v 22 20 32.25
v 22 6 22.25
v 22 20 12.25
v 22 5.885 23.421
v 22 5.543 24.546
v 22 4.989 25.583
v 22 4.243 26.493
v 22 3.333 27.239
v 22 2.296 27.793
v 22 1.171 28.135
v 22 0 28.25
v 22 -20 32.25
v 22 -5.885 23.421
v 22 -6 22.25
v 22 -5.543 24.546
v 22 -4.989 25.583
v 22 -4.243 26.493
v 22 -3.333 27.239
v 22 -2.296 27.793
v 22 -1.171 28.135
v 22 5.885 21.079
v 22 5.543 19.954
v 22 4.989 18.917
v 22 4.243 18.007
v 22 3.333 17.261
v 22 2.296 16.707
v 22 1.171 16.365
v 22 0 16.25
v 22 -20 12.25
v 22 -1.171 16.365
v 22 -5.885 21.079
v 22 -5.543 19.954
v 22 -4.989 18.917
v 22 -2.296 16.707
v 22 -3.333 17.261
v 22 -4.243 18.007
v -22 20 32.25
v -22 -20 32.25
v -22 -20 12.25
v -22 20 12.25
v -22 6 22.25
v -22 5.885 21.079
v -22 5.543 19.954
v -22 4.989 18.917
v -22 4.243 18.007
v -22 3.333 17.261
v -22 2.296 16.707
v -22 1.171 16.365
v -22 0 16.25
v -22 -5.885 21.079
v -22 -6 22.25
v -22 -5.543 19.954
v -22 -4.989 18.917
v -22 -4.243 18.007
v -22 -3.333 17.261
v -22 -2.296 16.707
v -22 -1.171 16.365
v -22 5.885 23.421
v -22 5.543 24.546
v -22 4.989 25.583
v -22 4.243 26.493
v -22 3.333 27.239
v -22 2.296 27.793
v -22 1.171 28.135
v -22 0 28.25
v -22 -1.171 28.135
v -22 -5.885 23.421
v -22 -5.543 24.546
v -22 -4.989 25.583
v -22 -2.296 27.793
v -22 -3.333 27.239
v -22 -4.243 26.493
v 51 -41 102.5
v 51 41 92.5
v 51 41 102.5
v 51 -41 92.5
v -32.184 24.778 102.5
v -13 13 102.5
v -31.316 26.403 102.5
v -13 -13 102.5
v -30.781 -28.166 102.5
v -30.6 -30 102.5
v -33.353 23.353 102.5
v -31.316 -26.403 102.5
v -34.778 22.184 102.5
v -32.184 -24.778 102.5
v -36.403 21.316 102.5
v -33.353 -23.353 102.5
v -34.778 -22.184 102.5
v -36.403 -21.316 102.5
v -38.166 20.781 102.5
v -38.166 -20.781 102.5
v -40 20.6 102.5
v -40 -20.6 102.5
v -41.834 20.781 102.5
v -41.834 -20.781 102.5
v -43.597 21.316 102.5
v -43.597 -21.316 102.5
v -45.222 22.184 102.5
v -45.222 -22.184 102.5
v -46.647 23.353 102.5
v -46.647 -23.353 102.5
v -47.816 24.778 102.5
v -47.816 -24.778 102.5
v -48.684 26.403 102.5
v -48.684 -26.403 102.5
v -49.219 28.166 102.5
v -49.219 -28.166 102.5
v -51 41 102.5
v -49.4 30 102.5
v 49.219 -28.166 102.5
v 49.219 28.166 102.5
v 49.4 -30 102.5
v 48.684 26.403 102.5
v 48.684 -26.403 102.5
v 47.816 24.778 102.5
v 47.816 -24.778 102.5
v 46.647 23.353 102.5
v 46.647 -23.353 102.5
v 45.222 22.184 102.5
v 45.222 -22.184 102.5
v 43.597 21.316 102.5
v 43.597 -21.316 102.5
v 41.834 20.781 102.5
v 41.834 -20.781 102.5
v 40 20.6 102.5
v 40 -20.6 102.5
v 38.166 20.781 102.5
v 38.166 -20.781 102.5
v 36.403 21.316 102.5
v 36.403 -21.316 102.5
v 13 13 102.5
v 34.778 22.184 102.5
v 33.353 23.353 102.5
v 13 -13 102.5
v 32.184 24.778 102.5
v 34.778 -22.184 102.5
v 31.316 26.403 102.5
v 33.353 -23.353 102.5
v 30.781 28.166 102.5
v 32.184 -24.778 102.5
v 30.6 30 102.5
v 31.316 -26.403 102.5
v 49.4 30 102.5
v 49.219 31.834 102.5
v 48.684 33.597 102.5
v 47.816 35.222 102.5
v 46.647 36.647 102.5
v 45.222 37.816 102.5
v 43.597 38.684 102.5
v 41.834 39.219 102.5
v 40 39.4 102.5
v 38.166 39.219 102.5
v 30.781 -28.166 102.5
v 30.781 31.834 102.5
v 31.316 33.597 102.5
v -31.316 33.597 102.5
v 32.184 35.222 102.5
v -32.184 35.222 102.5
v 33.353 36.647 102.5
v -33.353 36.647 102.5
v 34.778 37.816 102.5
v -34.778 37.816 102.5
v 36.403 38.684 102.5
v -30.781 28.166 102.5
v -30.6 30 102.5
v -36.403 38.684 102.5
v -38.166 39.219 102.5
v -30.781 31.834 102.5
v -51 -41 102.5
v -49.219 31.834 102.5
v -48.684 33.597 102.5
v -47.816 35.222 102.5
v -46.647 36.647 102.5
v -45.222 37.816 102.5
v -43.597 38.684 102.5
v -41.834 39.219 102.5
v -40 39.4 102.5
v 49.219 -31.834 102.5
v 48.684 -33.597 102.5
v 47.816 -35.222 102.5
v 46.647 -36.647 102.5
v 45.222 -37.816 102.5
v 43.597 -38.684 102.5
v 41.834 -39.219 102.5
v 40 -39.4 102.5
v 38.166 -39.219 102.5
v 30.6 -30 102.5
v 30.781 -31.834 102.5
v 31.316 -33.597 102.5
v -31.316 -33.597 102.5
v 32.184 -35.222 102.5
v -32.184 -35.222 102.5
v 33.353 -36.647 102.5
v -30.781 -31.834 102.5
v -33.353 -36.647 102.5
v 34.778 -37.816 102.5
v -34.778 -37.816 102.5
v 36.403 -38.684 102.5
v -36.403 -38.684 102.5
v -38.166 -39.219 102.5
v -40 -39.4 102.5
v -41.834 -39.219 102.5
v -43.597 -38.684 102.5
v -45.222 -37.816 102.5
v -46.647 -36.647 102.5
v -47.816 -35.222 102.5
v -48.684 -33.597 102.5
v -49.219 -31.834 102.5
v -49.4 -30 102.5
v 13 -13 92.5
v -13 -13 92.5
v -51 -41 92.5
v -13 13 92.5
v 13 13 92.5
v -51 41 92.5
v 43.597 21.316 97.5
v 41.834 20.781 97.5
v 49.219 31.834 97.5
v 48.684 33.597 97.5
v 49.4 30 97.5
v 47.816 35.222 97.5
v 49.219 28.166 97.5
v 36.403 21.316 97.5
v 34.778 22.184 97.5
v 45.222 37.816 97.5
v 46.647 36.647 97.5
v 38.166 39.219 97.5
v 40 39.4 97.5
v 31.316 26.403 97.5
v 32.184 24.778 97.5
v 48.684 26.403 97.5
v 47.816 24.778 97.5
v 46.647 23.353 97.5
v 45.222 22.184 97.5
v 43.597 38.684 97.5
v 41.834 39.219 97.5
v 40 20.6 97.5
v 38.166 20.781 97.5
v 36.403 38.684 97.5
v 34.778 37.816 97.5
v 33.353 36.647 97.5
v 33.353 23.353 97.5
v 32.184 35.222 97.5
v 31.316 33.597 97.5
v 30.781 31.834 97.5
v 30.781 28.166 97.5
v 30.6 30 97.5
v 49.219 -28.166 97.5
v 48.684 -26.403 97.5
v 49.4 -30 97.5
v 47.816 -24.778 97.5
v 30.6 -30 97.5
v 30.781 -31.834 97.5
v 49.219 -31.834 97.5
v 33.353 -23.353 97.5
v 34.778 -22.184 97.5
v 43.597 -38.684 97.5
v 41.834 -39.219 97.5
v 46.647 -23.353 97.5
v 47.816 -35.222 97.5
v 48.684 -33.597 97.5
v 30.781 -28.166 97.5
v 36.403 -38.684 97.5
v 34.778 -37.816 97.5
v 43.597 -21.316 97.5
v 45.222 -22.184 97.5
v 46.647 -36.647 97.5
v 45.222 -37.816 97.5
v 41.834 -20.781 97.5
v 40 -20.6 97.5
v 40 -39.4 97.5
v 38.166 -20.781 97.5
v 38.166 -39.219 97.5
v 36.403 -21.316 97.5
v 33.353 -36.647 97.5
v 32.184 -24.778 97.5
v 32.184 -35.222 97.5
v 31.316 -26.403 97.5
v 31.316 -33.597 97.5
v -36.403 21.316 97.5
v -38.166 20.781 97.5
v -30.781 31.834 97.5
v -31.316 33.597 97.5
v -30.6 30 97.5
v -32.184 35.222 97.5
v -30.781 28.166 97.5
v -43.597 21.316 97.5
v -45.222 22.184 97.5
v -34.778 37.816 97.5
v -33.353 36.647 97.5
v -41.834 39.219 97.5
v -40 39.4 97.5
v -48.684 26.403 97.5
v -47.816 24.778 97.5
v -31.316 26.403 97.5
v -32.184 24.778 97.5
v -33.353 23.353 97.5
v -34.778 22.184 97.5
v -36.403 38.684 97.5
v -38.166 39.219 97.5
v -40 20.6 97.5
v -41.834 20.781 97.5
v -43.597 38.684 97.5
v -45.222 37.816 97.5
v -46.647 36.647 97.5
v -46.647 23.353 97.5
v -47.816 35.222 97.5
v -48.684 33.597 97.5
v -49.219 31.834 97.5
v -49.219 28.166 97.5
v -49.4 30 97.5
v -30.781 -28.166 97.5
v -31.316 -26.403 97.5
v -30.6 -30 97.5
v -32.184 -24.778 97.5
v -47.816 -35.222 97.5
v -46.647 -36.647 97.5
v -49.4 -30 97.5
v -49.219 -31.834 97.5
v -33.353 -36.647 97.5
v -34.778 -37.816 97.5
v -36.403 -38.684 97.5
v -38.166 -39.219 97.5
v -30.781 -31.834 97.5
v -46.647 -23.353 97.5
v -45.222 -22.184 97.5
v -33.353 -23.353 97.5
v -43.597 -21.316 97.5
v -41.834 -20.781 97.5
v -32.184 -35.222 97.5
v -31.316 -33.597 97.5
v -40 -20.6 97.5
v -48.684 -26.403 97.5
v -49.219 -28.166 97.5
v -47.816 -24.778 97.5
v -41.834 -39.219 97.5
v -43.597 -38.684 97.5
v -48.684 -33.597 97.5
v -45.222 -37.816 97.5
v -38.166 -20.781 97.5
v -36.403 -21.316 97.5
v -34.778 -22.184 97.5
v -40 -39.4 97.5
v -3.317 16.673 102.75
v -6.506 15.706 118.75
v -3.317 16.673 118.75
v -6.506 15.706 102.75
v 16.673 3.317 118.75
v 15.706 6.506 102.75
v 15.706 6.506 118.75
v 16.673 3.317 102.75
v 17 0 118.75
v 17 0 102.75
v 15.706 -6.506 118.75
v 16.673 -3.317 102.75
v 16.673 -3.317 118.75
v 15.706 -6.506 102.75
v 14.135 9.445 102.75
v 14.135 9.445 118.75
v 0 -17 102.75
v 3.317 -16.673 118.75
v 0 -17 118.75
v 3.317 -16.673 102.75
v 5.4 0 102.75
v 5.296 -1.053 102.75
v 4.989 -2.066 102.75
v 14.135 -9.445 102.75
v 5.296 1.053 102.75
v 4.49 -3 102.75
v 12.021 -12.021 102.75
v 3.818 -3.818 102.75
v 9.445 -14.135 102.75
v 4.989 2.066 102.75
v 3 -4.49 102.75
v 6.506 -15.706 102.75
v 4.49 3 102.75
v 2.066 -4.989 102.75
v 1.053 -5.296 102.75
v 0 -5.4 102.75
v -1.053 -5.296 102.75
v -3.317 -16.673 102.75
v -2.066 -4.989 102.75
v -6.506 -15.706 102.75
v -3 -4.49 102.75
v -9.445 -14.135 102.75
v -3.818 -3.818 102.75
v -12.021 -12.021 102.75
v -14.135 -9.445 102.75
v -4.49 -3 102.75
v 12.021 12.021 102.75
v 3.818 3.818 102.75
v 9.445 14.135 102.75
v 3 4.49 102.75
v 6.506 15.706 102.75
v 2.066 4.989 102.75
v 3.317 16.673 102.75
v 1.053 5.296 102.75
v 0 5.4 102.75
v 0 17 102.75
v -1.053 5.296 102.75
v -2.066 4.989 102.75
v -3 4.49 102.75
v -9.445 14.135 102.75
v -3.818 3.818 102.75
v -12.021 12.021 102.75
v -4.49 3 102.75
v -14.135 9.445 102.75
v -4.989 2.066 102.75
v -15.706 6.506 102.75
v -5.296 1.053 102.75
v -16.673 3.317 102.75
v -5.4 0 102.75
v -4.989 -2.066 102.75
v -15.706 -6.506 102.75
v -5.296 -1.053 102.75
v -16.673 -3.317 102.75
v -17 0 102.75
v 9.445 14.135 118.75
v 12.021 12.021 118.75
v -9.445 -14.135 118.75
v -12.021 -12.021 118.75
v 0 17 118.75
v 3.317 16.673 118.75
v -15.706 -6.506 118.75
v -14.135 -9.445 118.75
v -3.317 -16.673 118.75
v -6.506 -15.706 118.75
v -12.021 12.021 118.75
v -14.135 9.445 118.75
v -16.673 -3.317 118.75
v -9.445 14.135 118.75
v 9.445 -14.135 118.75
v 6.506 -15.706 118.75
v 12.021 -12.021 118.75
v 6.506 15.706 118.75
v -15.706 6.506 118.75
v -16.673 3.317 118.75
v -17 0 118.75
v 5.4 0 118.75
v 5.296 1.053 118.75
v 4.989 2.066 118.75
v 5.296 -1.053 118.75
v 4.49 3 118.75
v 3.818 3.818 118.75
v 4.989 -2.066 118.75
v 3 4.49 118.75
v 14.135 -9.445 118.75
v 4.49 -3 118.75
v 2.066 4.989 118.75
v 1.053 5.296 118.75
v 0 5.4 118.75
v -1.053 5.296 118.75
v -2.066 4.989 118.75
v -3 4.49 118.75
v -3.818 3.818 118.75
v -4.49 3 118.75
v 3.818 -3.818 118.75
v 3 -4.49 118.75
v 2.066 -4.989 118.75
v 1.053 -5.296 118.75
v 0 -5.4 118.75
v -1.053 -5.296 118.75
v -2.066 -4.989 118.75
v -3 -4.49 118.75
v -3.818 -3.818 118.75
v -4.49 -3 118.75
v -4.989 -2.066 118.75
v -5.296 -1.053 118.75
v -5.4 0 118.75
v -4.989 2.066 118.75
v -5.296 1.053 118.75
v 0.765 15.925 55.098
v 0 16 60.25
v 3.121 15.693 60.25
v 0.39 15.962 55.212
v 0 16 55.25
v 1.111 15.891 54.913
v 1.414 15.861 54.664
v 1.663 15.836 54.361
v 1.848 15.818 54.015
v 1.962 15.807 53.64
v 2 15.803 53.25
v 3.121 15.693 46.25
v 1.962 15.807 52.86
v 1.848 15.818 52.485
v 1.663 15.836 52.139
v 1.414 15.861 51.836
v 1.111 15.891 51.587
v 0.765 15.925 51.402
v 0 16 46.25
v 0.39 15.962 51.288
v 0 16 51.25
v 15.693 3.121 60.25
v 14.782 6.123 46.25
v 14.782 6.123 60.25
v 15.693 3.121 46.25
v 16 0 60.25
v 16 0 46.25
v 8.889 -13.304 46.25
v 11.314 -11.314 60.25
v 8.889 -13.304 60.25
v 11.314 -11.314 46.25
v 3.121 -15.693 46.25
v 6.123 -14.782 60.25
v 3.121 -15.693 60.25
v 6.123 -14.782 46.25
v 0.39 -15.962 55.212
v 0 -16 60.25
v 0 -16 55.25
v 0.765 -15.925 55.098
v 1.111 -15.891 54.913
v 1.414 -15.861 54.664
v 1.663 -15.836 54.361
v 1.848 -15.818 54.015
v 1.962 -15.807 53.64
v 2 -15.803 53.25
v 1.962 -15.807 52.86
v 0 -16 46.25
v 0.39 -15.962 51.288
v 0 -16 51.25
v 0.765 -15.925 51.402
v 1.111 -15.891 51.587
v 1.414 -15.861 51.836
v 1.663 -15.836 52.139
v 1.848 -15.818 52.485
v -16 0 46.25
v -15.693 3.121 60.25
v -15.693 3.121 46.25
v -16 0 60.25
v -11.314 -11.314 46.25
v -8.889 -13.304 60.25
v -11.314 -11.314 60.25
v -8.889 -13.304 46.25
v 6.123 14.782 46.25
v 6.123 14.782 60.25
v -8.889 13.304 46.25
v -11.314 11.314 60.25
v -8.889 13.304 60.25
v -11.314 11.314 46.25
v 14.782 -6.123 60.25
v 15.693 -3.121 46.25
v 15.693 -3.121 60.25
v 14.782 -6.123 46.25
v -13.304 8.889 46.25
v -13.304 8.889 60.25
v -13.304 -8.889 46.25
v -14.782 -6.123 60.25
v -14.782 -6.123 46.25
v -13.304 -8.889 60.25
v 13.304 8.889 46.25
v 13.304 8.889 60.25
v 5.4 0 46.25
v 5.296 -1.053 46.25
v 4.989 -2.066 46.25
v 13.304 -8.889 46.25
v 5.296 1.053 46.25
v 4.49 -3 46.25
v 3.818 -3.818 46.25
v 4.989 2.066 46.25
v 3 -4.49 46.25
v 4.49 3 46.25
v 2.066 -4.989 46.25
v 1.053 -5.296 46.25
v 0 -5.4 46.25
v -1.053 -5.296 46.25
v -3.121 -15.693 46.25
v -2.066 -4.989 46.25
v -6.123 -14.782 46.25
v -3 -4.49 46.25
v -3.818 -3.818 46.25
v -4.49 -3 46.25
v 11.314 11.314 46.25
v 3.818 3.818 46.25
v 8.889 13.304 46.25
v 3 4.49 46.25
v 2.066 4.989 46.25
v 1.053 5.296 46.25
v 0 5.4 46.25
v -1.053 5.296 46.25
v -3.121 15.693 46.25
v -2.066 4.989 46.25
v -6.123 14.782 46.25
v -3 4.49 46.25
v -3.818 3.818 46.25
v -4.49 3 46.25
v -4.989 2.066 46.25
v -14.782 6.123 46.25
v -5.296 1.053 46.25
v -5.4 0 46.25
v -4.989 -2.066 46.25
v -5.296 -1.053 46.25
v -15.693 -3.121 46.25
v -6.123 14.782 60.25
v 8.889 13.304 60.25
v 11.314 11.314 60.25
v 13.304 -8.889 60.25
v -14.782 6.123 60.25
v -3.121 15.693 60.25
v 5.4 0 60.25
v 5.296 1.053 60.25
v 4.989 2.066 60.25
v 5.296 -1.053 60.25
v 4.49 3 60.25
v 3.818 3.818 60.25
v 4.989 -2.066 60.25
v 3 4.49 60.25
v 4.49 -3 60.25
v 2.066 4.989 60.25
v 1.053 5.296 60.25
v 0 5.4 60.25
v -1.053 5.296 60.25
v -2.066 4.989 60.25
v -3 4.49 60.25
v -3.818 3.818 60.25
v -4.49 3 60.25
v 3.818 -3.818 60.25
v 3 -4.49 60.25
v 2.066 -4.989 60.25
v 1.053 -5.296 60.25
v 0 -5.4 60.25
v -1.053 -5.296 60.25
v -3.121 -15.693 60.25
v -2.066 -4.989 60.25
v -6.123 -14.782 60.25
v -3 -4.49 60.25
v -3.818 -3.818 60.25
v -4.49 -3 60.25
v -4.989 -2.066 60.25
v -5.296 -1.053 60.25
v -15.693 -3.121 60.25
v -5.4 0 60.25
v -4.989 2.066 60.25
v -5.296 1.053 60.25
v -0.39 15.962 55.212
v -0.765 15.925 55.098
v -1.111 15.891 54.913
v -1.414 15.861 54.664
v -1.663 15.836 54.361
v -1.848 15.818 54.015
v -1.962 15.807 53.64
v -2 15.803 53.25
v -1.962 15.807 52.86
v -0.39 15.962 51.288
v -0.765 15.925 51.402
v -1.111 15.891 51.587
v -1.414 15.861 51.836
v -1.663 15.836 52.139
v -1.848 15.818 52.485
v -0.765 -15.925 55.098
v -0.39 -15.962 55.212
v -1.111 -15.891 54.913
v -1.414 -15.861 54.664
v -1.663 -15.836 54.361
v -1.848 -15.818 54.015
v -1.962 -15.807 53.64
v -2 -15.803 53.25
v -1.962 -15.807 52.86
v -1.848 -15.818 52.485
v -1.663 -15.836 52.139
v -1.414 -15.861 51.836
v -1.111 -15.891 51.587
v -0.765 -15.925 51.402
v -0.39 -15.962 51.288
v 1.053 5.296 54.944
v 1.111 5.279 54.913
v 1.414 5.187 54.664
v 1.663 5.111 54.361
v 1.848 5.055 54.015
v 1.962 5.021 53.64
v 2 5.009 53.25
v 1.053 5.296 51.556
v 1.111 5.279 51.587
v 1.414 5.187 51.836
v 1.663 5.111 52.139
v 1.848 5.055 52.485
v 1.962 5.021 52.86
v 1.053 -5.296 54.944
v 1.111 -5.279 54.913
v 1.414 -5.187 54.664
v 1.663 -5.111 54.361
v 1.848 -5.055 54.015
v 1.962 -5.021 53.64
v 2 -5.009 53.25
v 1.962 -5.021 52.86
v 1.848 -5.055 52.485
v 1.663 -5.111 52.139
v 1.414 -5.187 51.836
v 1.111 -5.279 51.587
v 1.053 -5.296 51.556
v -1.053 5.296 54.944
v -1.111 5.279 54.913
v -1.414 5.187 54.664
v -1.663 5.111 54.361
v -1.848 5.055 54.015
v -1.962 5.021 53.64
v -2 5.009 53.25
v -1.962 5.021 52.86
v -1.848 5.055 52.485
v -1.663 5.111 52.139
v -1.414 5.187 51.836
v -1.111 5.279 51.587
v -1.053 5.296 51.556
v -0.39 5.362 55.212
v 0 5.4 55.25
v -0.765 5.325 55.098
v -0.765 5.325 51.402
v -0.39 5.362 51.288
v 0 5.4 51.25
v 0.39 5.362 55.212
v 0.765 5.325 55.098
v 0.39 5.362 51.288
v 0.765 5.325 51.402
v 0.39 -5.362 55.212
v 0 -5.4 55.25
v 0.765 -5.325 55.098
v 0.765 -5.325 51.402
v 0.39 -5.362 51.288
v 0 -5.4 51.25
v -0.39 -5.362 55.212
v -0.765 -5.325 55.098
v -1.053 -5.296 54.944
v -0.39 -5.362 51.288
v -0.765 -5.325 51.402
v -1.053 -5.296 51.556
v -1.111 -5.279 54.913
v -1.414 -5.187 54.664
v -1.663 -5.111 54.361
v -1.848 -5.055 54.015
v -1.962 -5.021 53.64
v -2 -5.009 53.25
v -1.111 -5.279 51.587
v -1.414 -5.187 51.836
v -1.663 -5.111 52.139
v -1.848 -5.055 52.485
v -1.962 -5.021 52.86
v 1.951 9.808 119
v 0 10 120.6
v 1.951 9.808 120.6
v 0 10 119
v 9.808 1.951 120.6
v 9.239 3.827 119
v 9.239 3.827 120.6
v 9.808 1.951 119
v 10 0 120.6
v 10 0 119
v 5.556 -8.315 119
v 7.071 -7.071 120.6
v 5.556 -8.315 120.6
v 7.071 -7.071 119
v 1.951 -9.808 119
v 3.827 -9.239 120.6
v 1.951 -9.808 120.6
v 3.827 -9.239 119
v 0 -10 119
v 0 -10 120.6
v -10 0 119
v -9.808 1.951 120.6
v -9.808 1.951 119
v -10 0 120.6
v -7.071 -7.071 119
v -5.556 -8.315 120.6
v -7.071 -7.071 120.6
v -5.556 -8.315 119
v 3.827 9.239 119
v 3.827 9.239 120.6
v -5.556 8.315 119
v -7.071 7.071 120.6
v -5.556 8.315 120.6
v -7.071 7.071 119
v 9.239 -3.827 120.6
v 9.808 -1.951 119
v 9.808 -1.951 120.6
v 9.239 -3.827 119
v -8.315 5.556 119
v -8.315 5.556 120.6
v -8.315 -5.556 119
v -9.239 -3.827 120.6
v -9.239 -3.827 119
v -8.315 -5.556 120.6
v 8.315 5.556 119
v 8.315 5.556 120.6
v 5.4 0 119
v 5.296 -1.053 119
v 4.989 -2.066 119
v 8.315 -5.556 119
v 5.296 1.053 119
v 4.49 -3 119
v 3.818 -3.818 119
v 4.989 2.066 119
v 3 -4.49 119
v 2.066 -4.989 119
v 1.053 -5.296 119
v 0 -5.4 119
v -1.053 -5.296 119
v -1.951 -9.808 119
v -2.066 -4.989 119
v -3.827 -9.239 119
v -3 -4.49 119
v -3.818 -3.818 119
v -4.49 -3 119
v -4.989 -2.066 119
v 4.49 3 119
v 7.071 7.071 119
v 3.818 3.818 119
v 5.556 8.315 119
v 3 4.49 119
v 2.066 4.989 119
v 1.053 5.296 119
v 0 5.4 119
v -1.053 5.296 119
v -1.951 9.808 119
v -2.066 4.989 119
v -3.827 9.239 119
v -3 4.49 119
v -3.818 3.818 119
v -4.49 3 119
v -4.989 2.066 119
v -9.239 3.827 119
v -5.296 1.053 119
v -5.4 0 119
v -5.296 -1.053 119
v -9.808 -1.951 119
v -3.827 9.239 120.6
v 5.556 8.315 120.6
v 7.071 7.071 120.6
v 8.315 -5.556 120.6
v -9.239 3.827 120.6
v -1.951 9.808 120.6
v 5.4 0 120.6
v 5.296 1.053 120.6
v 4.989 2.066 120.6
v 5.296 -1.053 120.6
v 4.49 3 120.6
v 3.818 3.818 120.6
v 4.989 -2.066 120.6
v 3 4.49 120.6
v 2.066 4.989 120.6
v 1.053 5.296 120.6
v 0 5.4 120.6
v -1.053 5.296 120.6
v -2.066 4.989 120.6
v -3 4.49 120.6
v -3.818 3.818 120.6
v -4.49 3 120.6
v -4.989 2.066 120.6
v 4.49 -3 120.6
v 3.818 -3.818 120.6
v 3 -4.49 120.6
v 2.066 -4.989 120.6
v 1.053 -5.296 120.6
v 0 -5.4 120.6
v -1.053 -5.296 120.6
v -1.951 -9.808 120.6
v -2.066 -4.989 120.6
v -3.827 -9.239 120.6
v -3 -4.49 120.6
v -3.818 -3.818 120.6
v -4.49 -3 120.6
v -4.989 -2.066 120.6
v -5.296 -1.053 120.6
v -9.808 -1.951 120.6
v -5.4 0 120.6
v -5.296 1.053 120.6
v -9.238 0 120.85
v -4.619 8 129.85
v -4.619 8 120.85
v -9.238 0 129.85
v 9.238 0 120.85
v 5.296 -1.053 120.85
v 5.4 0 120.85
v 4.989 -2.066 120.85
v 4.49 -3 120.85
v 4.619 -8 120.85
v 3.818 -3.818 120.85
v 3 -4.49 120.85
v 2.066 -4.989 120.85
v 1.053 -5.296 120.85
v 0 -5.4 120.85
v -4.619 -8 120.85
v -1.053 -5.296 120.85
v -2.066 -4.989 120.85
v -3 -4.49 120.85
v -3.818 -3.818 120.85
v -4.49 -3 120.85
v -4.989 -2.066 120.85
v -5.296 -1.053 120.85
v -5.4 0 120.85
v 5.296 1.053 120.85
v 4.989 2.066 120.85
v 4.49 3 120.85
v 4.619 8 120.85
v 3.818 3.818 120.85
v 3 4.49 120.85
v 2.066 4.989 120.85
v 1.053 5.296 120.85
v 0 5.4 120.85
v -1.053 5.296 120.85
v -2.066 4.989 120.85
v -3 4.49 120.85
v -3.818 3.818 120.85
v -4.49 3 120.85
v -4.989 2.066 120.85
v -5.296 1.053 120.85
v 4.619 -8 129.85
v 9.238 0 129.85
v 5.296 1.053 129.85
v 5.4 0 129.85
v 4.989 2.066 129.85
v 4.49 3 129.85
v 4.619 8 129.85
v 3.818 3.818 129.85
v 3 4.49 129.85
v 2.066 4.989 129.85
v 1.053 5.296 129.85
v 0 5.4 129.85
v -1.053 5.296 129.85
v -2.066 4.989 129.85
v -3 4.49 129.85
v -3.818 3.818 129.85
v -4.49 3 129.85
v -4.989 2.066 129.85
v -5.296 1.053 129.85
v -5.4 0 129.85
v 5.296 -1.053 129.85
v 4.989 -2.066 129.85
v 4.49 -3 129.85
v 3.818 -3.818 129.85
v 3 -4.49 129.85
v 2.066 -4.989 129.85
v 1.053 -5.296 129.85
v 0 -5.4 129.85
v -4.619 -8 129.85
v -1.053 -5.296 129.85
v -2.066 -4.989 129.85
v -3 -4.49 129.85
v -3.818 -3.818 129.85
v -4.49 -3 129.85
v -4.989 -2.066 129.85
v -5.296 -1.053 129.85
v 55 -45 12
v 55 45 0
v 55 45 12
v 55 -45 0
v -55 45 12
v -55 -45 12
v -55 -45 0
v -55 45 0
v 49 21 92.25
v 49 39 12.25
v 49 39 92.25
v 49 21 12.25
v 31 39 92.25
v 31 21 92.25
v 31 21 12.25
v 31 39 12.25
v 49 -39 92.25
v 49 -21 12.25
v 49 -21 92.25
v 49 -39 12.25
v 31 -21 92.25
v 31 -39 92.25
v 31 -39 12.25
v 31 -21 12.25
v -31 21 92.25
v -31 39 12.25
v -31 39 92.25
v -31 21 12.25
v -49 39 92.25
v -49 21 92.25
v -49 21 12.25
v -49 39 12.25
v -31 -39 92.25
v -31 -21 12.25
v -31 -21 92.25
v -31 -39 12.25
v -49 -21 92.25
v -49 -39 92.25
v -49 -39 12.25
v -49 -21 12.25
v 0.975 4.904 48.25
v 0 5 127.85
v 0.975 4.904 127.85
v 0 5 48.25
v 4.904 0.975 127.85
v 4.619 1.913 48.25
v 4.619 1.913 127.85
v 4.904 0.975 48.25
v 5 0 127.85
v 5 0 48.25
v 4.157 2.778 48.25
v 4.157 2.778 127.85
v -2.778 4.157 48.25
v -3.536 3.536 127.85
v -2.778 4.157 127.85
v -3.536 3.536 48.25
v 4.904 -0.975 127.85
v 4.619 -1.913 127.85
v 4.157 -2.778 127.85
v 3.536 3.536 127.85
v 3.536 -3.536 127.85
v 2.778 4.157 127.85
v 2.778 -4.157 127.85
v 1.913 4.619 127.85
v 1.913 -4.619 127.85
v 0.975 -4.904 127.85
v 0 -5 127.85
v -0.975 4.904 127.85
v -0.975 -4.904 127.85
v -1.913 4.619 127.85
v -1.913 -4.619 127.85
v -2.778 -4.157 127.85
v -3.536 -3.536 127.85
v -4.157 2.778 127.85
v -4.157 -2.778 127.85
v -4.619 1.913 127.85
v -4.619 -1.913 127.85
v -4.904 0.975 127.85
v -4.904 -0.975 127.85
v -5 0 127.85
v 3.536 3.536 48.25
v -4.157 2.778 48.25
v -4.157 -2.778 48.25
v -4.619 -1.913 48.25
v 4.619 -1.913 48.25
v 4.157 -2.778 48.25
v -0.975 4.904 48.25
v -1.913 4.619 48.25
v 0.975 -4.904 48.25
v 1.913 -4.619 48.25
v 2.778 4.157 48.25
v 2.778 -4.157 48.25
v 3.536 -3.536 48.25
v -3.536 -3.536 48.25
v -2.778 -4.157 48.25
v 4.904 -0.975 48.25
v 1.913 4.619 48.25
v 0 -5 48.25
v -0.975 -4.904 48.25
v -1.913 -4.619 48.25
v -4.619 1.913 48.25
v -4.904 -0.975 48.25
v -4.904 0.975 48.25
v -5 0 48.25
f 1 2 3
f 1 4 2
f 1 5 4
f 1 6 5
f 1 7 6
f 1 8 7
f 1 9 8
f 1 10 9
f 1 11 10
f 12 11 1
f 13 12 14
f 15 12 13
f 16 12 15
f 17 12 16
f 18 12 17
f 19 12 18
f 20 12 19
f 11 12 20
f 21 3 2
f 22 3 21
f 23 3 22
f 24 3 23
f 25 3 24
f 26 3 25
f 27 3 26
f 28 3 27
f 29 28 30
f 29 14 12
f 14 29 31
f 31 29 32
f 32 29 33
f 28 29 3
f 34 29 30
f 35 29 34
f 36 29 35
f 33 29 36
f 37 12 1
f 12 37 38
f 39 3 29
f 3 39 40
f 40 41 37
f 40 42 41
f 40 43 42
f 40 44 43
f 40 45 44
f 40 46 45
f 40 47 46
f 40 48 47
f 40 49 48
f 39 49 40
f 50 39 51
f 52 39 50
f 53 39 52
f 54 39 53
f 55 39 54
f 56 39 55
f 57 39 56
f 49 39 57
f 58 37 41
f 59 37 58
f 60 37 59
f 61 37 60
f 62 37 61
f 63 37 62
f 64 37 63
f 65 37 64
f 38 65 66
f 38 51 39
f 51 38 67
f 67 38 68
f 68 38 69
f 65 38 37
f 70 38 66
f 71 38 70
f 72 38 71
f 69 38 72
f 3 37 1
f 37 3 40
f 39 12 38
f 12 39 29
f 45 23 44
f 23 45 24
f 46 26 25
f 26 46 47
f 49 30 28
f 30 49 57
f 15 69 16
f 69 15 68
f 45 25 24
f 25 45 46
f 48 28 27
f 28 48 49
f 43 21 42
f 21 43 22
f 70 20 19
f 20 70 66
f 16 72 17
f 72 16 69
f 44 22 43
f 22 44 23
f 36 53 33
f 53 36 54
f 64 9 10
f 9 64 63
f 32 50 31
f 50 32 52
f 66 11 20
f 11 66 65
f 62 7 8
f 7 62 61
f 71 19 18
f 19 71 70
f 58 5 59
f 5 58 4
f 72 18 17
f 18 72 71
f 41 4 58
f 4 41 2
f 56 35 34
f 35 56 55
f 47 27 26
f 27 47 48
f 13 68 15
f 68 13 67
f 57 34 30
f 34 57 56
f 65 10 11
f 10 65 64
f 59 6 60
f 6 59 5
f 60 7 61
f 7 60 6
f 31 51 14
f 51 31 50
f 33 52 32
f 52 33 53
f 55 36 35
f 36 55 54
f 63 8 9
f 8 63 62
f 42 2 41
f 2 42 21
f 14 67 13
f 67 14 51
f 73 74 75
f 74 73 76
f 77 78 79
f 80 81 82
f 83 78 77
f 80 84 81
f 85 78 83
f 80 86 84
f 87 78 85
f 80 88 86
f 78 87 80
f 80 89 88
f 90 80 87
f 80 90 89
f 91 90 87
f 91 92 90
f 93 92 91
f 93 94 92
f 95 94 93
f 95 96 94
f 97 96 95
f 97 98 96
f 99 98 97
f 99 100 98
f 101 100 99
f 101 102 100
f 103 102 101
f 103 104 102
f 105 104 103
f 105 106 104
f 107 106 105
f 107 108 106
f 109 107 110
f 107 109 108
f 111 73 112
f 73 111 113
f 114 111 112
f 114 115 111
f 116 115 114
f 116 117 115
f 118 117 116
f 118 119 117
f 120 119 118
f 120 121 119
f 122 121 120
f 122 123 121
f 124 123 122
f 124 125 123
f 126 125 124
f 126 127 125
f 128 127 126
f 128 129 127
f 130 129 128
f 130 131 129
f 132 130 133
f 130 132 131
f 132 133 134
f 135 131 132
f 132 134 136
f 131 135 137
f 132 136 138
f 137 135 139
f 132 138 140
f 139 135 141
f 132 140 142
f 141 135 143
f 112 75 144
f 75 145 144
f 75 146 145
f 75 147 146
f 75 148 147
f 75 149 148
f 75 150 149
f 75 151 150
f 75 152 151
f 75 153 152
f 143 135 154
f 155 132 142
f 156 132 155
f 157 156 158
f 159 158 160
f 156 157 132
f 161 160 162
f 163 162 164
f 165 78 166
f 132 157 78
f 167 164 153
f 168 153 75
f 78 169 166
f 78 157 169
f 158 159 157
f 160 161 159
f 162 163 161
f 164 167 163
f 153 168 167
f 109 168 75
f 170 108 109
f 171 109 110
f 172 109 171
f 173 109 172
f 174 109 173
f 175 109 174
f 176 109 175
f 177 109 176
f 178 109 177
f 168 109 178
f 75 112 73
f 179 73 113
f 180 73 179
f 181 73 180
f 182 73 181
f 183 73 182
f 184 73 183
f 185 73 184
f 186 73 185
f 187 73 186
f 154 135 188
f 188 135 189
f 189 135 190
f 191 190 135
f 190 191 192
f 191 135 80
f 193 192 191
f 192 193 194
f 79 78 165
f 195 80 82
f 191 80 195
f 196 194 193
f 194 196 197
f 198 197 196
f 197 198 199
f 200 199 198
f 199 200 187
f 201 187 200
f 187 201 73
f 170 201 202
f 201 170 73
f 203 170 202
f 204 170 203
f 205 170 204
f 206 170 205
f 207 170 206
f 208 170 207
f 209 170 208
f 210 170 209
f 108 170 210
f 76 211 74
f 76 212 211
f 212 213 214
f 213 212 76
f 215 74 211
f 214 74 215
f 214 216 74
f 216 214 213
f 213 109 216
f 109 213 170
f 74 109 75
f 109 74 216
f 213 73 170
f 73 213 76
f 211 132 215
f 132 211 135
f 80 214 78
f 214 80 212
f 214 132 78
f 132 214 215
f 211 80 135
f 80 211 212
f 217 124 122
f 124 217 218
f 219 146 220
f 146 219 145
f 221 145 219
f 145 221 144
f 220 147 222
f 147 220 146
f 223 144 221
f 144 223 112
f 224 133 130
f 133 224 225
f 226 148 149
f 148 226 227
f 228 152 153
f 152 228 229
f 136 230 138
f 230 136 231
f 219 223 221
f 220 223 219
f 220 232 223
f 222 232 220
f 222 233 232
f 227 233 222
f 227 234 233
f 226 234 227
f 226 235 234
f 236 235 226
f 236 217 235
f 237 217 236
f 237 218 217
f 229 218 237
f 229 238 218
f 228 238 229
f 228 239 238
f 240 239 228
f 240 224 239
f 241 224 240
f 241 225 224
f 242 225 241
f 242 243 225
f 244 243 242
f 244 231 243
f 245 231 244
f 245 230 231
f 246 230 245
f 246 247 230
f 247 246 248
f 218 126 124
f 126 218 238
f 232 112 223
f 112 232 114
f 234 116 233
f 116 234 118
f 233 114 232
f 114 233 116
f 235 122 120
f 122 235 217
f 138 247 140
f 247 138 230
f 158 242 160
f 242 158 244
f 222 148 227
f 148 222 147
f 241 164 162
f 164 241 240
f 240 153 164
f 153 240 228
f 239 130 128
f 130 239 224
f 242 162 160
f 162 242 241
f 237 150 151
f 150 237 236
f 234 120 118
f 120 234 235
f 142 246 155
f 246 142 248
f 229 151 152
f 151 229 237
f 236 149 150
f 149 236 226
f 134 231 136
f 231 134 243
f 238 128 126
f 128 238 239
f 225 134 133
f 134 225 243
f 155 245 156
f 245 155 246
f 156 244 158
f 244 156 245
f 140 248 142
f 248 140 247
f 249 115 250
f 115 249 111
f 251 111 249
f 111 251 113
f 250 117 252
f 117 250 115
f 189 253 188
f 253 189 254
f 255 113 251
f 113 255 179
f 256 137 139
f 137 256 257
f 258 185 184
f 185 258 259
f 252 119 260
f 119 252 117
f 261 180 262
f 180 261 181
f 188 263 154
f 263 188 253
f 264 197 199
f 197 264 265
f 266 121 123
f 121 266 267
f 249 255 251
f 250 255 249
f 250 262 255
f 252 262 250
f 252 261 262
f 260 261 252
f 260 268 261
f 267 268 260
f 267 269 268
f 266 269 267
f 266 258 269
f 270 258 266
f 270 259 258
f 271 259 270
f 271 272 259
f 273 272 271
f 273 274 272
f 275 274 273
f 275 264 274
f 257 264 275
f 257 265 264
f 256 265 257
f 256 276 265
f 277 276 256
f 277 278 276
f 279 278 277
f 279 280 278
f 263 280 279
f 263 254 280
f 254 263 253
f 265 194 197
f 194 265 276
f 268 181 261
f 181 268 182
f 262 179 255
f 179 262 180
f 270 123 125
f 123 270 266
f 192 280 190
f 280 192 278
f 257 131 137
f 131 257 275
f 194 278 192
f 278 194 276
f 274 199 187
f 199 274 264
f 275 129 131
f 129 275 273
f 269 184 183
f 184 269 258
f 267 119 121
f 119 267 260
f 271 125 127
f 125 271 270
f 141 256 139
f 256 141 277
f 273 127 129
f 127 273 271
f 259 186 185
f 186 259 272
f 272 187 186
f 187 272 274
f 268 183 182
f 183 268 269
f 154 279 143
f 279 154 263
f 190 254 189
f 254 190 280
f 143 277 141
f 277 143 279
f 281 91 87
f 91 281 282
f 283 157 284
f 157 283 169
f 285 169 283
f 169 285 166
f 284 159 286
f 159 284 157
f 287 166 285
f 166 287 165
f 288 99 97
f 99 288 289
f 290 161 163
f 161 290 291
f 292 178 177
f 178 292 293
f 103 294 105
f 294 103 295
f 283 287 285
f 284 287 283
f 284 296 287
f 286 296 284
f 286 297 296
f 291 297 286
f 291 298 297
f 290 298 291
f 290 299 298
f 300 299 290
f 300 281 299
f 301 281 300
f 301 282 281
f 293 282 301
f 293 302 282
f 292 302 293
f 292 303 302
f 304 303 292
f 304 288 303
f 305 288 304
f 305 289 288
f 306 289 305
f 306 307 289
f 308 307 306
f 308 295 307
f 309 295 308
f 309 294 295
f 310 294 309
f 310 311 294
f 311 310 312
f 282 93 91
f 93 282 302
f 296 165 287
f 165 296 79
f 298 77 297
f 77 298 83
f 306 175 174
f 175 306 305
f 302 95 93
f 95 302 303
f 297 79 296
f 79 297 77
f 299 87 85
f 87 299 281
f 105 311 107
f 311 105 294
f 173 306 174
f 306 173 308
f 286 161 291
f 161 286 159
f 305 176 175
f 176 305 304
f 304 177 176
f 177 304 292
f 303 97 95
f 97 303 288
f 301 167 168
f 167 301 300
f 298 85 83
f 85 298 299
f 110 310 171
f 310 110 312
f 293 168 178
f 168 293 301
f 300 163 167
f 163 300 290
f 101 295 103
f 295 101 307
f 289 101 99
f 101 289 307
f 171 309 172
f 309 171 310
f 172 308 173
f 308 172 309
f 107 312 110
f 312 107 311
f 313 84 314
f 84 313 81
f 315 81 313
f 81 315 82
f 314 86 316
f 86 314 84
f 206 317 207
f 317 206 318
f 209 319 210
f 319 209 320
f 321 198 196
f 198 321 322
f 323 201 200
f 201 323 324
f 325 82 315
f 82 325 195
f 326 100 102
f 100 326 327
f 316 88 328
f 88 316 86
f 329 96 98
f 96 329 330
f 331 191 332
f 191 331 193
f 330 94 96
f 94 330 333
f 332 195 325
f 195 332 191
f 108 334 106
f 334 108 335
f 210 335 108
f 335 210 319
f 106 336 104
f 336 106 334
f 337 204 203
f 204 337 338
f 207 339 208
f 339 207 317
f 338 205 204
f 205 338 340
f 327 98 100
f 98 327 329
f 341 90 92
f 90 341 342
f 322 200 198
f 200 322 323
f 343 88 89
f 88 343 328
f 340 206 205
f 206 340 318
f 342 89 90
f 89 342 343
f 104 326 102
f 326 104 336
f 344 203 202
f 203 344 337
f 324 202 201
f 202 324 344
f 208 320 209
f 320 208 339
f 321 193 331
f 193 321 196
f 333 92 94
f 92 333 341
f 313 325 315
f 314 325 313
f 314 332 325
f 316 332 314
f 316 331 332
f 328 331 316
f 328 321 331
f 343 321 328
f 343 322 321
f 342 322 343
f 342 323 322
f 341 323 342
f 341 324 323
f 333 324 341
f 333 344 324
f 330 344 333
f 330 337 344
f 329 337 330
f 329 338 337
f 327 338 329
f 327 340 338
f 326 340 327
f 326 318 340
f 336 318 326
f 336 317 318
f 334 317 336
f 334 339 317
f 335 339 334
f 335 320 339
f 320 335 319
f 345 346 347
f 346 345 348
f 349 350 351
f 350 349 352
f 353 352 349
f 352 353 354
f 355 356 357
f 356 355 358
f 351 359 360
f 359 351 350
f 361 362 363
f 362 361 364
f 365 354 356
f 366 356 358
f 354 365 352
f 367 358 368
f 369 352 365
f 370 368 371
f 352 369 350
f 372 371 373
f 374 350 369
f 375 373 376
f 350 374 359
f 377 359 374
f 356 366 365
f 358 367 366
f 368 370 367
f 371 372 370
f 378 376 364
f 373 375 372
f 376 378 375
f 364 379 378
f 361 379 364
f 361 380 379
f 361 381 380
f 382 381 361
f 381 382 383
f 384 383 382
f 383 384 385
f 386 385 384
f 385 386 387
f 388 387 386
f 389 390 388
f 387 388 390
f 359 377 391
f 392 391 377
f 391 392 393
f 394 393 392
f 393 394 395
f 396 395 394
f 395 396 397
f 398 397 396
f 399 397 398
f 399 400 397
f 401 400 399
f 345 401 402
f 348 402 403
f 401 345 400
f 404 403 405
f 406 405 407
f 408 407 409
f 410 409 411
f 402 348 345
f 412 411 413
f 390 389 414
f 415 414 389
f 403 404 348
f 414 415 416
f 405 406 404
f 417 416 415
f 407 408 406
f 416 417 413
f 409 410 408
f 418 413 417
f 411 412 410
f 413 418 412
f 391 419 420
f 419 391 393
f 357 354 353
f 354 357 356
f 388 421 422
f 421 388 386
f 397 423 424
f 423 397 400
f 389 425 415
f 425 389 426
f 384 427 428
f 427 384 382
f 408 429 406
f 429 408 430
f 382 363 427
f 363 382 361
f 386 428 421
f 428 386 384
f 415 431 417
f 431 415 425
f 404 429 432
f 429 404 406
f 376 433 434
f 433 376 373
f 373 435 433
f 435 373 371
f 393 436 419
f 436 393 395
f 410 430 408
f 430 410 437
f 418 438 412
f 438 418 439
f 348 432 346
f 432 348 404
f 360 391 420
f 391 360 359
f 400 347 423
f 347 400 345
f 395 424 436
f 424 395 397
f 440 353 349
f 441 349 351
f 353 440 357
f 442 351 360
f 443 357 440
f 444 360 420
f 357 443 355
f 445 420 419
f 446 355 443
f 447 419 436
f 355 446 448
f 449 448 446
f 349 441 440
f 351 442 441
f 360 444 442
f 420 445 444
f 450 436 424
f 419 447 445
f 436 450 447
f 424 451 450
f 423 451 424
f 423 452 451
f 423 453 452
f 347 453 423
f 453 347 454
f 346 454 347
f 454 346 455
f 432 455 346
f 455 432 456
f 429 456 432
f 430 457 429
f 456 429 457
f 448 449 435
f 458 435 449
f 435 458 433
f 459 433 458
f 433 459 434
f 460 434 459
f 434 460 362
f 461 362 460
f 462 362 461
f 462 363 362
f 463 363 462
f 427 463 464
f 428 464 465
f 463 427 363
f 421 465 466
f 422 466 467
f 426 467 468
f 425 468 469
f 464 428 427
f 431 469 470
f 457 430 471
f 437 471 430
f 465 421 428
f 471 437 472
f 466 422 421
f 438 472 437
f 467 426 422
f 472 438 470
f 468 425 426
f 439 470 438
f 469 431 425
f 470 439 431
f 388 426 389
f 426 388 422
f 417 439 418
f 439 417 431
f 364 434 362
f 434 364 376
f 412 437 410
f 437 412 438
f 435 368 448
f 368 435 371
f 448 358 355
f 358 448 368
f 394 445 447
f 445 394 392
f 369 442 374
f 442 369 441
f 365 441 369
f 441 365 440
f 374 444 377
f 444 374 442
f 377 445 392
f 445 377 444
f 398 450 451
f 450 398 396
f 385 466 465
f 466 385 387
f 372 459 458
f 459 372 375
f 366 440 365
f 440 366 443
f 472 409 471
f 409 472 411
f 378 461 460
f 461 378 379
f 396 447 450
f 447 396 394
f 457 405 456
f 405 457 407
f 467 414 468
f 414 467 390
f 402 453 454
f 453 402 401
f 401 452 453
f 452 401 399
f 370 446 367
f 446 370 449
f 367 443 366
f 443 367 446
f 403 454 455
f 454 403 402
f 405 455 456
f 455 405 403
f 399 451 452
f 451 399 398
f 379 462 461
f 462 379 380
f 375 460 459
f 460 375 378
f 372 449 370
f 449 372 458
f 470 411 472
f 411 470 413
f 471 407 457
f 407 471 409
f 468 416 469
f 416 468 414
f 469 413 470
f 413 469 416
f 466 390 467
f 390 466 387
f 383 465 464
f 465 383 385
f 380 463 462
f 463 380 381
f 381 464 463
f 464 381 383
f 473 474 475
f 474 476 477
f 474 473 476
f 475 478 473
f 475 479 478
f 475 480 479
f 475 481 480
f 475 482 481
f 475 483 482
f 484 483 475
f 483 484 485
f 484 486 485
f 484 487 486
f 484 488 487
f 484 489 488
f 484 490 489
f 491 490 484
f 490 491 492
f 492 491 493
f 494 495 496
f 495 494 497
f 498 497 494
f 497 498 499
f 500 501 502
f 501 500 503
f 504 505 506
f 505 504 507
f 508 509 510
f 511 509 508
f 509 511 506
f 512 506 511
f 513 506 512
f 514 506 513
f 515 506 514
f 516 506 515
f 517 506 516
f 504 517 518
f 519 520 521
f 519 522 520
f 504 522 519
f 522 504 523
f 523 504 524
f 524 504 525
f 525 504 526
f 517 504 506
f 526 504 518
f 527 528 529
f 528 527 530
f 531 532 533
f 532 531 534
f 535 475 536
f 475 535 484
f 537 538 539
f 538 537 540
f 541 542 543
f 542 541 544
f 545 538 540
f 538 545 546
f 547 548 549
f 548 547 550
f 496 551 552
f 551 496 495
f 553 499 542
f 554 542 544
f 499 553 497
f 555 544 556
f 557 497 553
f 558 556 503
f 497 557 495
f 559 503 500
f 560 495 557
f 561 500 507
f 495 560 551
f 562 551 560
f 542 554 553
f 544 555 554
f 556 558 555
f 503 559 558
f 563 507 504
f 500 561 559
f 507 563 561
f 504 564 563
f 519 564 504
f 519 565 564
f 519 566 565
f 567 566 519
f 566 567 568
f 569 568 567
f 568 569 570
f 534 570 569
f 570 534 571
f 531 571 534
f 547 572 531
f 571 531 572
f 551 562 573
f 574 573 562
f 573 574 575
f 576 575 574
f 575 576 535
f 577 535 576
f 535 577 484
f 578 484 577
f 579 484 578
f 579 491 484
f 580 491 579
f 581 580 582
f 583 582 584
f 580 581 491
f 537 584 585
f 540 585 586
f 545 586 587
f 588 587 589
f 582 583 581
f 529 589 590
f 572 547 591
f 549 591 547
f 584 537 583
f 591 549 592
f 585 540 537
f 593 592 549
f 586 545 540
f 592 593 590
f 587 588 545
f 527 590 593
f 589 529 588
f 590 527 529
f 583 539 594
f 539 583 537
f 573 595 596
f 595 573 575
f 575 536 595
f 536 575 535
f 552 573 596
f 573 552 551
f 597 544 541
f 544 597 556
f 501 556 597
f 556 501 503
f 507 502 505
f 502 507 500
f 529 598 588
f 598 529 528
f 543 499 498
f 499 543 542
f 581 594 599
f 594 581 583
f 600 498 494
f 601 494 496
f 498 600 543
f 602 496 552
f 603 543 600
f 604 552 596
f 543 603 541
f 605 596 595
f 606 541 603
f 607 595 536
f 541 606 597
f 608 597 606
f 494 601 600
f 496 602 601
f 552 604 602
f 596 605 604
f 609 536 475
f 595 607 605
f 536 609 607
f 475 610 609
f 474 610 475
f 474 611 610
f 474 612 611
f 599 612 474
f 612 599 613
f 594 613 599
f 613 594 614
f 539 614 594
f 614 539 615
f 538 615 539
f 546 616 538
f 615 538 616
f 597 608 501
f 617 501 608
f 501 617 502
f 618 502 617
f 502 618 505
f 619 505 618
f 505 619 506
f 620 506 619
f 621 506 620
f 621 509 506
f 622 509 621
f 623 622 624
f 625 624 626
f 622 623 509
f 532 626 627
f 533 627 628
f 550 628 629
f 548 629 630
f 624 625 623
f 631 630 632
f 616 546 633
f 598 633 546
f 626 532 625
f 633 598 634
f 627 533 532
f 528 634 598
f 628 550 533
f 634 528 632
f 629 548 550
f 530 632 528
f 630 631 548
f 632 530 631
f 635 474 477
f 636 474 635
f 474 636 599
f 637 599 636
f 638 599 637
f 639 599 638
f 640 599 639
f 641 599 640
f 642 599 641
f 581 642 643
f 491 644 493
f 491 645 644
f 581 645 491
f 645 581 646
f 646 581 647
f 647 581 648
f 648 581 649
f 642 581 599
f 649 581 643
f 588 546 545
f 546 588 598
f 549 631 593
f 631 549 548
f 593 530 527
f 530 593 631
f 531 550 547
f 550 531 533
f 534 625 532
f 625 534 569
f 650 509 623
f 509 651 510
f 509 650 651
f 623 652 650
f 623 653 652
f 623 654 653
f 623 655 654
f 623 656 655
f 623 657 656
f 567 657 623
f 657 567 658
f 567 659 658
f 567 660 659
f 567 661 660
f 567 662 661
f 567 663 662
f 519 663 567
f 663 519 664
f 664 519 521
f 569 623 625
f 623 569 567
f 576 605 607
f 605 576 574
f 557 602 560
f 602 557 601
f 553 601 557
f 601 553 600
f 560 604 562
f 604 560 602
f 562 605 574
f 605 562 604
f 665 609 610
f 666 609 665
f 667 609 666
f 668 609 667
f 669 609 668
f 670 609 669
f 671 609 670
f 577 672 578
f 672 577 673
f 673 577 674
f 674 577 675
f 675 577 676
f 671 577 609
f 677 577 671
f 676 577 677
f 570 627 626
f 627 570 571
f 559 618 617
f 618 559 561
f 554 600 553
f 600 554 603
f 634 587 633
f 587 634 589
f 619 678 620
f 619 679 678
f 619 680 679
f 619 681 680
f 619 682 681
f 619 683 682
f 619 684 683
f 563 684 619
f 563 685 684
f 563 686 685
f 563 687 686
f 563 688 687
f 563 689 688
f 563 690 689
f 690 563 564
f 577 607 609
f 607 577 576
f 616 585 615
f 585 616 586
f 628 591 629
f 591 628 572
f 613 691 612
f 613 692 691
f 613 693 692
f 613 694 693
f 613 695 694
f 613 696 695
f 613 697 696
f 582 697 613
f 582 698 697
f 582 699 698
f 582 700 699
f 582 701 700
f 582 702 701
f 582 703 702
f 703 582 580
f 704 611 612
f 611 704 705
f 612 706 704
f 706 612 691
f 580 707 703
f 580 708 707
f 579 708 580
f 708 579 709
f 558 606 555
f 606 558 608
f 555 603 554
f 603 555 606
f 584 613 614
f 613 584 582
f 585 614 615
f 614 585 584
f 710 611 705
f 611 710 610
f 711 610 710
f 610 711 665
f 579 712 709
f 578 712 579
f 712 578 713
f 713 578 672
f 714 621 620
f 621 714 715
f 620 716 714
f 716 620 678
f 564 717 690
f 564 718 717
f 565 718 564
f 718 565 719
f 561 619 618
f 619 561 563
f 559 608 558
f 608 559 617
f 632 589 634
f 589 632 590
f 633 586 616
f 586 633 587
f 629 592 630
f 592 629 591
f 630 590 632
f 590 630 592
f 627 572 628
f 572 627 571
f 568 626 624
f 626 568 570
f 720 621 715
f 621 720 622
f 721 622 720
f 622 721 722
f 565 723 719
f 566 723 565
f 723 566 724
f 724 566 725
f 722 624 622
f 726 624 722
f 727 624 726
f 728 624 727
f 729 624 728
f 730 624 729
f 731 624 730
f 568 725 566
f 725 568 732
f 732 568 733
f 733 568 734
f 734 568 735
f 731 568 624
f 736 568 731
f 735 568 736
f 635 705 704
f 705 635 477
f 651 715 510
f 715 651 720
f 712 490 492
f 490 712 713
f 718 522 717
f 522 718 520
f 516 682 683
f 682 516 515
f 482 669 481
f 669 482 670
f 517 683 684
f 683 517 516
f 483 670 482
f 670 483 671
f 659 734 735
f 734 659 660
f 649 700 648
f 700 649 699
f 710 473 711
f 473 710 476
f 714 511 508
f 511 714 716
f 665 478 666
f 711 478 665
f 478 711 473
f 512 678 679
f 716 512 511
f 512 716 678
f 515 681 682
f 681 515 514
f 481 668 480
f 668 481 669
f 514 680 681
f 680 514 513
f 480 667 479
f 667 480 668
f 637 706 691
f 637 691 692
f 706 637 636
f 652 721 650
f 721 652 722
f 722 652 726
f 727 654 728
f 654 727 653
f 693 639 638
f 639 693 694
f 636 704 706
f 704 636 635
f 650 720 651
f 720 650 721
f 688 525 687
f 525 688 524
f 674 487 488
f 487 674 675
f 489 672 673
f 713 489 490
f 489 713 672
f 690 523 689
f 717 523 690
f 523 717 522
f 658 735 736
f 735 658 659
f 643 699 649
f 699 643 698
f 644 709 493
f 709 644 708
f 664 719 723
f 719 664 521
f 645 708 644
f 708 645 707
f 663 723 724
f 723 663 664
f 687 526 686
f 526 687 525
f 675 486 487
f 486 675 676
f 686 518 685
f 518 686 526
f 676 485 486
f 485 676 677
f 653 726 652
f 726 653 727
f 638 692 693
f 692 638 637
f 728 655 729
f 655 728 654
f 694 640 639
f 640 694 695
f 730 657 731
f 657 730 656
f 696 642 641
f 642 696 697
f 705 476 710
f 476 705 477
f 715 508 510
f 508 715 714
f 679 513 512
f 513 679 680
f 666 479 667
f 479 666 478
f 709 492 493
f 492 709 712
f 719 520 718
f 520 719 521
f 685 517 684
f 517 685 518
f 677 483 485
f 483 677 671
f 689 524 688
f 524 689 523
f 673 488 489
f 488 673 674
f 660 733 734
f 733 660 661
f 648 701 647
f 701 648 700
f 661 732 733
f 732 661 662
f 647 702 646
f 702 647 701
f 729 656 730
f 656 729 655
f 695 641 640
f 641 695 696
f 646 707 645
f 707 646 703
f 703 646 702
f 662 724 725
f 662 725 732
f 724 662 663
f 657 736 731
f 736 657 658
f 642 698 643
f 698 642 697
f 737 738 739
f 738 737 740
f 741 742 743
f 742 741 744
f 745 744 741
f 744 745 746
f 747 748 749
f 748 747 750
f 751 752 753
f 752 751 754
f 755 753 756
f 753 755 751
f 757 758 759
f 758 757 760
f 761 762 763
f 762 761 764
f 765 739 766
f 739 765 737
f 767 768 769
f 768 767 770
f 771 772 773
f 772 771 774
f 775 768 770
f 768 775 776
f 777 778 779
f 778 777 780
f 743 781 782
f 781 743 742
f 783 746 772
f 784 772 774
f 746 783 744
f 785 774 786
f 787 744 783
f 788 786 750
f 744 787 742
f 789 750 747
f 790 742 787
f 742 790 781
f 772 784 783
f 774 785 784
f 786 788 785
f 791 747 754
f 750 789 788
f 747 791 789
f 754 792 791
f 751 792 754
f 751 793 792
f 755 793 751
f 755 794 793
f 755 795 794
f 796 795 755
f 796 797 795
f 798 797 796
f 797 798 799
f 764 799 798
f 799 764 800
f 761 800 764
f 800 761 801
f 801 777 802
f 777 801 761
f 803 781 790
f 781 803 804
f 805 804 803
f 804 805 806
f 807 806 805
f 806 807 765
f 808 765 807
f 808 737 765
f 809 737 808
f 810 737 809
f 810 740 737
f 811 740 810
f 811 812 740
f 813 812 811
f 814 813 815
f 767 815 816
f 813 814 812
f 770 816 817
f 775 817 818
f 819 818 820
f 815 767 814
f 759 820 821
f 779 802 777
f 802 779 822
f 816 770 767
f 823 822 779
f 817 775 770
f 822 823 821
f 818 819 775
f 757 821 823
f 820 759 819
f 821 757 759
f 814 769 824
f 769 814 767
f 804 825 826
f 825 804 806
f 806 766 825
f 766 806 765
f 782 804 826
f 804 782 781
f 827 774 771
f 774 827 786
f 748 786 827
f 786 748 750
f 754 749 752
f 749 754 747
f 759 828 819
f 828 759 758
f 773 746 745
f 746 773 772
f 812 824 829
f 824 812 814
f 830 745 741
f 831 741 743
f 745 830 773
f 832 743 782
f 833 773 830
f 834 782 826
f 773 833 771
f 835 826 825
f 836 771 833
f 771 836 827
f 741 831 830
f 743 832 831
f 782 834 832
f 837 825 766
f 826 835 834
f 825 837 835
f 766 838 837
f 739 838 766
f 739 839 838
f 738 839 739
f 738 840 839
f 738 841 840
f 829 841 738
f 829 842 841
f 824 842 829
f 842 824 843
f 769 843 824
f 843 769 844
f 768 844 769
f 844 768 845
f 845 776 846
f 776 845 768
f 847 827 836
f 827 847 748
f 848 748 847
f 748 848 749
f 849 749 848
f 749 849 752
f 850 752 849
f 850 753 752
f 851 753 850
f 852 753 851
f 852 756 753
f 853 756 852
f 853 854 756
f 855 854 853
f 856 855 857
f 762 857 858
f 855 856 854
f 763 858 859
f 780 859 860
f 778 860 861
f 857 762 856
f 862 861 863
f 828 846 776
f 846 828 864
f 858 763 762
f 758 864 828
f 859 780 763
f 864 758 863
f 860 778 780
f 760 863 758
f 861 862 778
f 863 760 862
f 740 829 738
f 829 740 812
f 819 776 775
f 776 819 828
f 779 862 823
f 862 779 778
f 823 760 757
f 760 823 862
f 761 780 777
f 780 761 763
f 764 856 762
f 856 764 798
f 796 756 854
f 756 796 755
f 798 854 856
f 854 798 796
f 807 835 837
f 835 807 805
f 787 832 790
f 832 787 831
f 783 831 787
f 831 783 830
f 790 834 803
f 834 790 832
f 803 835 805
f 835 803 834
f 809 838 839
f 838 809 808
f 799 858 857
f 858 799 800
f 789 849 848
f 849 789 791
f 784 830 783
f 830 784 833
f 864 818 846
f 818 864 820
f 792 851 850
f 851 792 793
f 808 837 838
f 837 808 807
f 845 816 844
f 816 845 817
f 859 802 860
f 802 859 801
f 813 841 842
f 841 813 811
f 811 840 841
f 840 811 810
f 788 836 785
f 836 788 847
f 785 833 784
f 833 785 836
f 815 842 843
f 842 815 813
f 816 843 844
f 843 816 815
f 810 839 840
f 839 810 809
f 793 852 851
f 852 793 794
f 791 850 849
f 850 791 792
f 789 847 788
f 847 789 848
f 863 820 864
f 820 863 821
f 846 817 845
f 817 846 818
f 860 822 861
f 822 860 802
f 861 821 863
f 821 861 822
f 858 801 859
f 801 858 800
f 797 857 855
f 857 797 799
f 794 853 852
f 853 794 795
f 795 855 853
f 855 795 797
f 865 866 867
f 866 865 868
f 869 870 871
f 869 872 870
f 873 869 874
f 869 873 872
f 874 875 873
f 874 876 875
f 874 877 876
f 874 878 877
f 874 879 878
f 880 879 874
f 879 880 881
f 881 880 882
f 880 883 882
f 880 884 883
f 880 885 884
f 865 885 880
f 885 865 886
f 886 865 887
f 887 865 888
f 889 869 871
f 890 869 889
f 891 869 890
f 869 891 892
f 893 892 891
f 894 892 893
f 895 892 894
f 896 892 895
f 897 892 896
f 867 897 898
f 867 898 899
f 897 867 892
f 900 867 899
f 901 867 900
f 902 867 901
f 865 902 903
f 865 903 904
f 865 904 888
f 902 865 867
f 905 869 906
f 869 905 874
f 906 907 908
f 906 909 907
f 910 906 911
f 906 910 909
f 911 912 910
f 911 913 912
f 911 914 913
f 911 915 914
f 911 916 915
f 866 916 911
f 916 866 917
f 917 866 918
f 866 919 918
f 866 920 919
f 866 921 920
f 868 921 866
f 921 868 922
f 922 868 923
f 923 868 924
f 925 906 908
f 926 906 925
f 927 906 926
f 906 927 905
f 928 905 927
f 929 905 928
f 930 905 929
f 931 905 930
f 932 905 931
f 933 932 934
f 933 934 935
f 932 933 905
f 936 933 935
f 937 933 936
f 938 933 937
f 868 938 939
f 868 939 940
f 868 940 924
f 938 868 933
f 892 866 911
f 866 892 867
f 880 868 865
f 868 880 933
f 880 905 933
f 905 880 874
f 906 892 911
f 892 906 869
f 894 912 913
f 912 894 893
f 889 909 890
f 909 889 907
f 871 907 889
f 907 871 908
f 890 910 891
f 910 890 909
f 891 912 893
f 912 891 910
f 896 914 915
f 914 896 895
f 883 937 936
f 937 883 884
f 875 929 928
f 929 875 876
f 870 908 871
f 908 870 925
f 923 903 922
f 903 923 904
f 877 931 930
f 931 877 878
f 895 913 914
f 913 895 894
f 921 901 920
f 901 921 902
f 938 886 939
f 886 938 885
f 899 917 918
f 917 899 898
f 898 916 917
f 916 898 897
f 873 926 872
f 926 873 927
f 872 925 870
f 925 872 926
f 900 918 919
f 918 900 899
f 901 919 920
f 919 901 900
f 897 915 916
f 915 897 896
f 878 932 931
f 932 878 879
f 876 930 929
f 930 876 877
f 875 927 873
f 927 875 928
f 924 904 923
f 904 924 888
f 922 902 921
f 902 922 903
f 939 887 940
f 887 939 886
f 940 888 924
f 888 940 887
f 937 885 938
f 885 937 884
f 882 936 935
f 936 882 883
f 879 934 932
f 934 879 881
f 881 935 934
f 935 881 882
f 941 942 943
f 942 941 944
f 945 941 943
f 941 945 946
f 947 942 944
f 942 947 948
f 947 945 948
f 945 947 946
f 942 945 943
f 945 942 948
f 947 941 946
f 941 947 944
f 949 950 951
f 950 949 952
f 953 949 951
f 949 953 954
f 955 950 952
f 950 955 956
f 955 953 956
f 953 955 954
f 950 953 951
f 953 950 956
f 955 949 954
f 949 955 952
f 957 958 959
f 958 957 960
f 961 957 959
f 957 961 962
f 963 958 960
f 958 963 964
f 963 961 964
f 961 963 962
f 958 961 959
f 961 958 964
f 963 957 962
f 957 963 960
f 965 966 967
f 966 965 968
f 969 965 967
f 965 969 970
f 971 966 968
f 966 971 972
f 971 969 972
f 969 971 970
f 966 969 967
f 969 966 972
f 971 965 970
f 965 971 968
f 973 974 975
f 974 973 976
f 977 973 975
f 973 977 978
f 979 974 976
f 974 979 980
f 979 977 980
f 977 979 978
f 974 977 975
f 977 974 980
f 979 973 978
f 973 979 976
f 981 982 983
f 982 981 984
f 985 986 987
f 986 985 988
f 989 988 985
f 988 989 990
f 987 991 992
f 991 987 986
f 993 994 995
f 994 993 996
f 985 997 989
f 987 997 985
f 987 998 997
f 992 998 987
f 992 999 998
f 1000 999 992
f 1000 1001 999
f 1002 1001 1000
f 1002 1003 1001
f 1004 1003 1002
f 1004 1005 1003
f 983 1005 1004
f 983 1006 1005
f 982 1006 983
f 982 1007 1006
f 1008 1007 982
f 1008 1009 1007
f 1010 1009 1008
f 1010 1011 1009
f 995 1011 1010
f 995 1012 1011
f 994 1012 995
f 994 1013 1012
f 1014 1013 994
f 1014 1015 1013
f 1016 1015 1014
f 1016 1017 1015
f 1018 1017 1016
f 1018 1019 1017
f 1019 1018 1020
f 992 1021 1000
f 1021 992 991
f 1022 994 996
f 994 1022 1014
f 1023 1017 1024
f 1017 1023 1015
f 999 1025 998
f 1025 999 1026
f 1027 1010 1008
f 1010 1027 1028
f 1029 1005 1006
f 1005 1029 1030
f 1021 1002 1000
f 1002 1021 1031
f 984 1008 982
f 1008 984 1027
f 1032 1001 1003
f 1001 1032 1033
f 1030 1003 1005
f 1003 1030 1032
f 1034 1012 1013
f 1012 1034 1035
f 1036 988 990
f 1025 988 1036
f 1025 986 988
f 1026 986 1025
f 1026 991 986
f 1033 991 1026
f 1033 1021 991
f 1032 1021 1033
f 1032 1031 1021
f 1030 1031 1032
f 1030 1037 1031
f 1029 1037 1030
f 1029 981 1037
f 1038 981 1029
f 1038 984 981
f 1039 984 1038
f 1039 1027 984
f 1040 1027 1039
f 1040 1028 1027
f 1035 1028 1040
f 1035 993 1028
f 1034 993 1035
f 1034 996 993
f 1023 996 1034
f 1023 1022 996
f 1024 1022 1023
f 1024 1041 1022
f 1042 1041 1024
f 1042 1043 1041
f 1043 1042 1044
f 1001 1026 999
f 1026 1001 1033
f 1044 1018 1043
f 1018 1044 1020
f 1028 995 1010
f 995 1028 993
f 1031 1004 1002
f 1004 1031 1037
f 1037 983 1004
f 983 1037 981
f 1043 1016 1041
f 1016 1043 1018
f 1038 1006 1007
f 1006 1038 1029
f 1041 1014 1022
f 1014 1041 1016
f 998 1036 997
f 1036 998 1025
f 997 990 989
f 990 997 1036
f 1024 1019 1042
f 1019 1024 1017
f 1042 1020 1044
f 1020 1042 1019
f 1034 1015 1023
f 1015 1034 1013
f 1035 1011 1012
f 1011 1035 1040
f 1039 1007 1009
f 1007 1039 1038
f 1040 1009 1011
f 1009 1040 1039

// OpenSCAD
$fn = 32;

// ------------------------------------------------------------------------
// Arbor press fixture: screw d10, posts 80 mm, gap 14 mm
// Every part is its own module, assembly() places every instance.
// ------------------------------------------------------------------------

// --- part 1 ---
module press_bed() {
  difference() {
    translate([-55, -45, 0]) cube([110, 90, 12]);
  }
}

// --- part 2 ---
module anvil_block() {
  difference() {
    translate([-22, -20, 0]) cube([44, 40, 20]);
    translate([0, 0, 10]) rotate([0, 90, 0]) cylinder(h = 46, d = 12, center = true);
  }
}

// --- part 3 ---
module press_post_a() {
  translate([-9, -9, 0]) cube([18, 18, 80]);
}

// --- part 4 ---
module press_post_b() {
  translate([-9, -9, 0]) cube([18, 18, 80]);
}

// --- part 5 ---
module press_post_c() {
  translate([-9, -9, 0]) cube([18, 18, 80]);
}

// --- part 6 ---
module press_post_d() {
  translate([-9, -9, 0]) cube([18, 18, 80]);
}

// --- part 7 ---
module press_frame() {
  difference() {
    translate([-51, -41, 0]) cube([102, 82, 10]);
    translate([-13, -13, -1]) cube([26, 26, 12]);
    translate([40, 30, 5]) cylinder(h = 6, d = 18.8);
    translate([40, -30, 5]) cylinder(h = 6, d = 18.8);
    translate([-40, 30, 5]) cylinder(h = 6, d = 18.8);
    translate([-40, -30, 5]) cylinder(h = 6, d = 18.8);
  }
}

// --- part 8 ---
module guide_ring() {
  difference() {
      translate([0, 0, 0]) cylinder(h = 16, d = 34);
      translate([0, 0, -1]) cylinder(h = 18, d = 10.8);
    }
}

// --- part 9 ---
module press_screw() {
  translate([0, 0, -39.8]) cylinder(h = 79.6, d = 10);
}

// --- part 10 ---
module press_head() {
  difference() {
    cylinder(h = 14, d = 32);
    translate([0, 0, -1]) cylinder(h = 16, d = 10.8);
    translate([0, 0, 7]) rotate([90, 0, 0]) cylinder(h = 34, d = 4, center = true);
  }
}

// --- part 11 ---
module nut_washer() {
  difference() {
      translate([0, 0, 0]) cylinder(h = 1.6, d = 20);
      translate([0, 0, -1]) cylinder(h = 3.6, d = 10.8);
    }
}

// --- part 12 ---
module press_nut() {
  difference() {
    linear_extrude(height = 9) polygon(points = [[9.238, 0], [4.619, 8], [-4.619, 8], [-9.238, 0], [-4.619, -8], [4.619, -8]]);
    translate([0, 0, -1]) cylinder(h = 11, d = 10.8);
  }
}

// --- assembly ---
module assembly() {
  color([0.80, 0.24, 0.20]) translate([0, 0, 0]) rotate([0, 0, 0]) press_bed();
  color([0.20, 0.45, 0.75]) translate([0, 0, 12.25]) rotate([0, 0, 0]) anvil_block();
  color([0.25, 0.62, 0.32]) translate([40, 30, 12.25]) rotate([0, 0, 0]) press_post_a();
  color([0.92, 0.70, 0.18]) translate([40, -30, 12.25]) rotate([0, 0, 0]) press_post_b();
  color([0.58, 0.35, 0.70]) translate([-40, 30, 12.25]) rotate([0, 0, 0]) press_post_c();
  color([0.16, 0.66, 0.66]) translate([-40, -30, 12.25]) rotate([0, 0, 0]) press_post_d();
  color([0.85, 0.48, 0.18]) translate([0, 0, 92.5]) rotate([0, 0, 0]) press_frame();
  color([0.55, 0.60, 0.65]) translate([0, 0, 102.75]) rotate([0, 0, 0]) guide_ring();
  color([0.75, 0.30, 0.55]) translate([0, 0, 88.05]) rotate([0, 0, 0]) press_screw();
  color([0.42, 0.52, 0.28]) translate([0, 0, 46.25]) rotate([0, 0, 0]) press_head();
  color([0.80, 0.24, 0.20]) translate([0, 0, 119]) rotate([0, 0, 0]) nut_washer();
  color([0.20, 0.45, 0.75]) translate([0, 0, 120.85]) rotate([0, 0, 0]) press_nut();
}

assembly();
